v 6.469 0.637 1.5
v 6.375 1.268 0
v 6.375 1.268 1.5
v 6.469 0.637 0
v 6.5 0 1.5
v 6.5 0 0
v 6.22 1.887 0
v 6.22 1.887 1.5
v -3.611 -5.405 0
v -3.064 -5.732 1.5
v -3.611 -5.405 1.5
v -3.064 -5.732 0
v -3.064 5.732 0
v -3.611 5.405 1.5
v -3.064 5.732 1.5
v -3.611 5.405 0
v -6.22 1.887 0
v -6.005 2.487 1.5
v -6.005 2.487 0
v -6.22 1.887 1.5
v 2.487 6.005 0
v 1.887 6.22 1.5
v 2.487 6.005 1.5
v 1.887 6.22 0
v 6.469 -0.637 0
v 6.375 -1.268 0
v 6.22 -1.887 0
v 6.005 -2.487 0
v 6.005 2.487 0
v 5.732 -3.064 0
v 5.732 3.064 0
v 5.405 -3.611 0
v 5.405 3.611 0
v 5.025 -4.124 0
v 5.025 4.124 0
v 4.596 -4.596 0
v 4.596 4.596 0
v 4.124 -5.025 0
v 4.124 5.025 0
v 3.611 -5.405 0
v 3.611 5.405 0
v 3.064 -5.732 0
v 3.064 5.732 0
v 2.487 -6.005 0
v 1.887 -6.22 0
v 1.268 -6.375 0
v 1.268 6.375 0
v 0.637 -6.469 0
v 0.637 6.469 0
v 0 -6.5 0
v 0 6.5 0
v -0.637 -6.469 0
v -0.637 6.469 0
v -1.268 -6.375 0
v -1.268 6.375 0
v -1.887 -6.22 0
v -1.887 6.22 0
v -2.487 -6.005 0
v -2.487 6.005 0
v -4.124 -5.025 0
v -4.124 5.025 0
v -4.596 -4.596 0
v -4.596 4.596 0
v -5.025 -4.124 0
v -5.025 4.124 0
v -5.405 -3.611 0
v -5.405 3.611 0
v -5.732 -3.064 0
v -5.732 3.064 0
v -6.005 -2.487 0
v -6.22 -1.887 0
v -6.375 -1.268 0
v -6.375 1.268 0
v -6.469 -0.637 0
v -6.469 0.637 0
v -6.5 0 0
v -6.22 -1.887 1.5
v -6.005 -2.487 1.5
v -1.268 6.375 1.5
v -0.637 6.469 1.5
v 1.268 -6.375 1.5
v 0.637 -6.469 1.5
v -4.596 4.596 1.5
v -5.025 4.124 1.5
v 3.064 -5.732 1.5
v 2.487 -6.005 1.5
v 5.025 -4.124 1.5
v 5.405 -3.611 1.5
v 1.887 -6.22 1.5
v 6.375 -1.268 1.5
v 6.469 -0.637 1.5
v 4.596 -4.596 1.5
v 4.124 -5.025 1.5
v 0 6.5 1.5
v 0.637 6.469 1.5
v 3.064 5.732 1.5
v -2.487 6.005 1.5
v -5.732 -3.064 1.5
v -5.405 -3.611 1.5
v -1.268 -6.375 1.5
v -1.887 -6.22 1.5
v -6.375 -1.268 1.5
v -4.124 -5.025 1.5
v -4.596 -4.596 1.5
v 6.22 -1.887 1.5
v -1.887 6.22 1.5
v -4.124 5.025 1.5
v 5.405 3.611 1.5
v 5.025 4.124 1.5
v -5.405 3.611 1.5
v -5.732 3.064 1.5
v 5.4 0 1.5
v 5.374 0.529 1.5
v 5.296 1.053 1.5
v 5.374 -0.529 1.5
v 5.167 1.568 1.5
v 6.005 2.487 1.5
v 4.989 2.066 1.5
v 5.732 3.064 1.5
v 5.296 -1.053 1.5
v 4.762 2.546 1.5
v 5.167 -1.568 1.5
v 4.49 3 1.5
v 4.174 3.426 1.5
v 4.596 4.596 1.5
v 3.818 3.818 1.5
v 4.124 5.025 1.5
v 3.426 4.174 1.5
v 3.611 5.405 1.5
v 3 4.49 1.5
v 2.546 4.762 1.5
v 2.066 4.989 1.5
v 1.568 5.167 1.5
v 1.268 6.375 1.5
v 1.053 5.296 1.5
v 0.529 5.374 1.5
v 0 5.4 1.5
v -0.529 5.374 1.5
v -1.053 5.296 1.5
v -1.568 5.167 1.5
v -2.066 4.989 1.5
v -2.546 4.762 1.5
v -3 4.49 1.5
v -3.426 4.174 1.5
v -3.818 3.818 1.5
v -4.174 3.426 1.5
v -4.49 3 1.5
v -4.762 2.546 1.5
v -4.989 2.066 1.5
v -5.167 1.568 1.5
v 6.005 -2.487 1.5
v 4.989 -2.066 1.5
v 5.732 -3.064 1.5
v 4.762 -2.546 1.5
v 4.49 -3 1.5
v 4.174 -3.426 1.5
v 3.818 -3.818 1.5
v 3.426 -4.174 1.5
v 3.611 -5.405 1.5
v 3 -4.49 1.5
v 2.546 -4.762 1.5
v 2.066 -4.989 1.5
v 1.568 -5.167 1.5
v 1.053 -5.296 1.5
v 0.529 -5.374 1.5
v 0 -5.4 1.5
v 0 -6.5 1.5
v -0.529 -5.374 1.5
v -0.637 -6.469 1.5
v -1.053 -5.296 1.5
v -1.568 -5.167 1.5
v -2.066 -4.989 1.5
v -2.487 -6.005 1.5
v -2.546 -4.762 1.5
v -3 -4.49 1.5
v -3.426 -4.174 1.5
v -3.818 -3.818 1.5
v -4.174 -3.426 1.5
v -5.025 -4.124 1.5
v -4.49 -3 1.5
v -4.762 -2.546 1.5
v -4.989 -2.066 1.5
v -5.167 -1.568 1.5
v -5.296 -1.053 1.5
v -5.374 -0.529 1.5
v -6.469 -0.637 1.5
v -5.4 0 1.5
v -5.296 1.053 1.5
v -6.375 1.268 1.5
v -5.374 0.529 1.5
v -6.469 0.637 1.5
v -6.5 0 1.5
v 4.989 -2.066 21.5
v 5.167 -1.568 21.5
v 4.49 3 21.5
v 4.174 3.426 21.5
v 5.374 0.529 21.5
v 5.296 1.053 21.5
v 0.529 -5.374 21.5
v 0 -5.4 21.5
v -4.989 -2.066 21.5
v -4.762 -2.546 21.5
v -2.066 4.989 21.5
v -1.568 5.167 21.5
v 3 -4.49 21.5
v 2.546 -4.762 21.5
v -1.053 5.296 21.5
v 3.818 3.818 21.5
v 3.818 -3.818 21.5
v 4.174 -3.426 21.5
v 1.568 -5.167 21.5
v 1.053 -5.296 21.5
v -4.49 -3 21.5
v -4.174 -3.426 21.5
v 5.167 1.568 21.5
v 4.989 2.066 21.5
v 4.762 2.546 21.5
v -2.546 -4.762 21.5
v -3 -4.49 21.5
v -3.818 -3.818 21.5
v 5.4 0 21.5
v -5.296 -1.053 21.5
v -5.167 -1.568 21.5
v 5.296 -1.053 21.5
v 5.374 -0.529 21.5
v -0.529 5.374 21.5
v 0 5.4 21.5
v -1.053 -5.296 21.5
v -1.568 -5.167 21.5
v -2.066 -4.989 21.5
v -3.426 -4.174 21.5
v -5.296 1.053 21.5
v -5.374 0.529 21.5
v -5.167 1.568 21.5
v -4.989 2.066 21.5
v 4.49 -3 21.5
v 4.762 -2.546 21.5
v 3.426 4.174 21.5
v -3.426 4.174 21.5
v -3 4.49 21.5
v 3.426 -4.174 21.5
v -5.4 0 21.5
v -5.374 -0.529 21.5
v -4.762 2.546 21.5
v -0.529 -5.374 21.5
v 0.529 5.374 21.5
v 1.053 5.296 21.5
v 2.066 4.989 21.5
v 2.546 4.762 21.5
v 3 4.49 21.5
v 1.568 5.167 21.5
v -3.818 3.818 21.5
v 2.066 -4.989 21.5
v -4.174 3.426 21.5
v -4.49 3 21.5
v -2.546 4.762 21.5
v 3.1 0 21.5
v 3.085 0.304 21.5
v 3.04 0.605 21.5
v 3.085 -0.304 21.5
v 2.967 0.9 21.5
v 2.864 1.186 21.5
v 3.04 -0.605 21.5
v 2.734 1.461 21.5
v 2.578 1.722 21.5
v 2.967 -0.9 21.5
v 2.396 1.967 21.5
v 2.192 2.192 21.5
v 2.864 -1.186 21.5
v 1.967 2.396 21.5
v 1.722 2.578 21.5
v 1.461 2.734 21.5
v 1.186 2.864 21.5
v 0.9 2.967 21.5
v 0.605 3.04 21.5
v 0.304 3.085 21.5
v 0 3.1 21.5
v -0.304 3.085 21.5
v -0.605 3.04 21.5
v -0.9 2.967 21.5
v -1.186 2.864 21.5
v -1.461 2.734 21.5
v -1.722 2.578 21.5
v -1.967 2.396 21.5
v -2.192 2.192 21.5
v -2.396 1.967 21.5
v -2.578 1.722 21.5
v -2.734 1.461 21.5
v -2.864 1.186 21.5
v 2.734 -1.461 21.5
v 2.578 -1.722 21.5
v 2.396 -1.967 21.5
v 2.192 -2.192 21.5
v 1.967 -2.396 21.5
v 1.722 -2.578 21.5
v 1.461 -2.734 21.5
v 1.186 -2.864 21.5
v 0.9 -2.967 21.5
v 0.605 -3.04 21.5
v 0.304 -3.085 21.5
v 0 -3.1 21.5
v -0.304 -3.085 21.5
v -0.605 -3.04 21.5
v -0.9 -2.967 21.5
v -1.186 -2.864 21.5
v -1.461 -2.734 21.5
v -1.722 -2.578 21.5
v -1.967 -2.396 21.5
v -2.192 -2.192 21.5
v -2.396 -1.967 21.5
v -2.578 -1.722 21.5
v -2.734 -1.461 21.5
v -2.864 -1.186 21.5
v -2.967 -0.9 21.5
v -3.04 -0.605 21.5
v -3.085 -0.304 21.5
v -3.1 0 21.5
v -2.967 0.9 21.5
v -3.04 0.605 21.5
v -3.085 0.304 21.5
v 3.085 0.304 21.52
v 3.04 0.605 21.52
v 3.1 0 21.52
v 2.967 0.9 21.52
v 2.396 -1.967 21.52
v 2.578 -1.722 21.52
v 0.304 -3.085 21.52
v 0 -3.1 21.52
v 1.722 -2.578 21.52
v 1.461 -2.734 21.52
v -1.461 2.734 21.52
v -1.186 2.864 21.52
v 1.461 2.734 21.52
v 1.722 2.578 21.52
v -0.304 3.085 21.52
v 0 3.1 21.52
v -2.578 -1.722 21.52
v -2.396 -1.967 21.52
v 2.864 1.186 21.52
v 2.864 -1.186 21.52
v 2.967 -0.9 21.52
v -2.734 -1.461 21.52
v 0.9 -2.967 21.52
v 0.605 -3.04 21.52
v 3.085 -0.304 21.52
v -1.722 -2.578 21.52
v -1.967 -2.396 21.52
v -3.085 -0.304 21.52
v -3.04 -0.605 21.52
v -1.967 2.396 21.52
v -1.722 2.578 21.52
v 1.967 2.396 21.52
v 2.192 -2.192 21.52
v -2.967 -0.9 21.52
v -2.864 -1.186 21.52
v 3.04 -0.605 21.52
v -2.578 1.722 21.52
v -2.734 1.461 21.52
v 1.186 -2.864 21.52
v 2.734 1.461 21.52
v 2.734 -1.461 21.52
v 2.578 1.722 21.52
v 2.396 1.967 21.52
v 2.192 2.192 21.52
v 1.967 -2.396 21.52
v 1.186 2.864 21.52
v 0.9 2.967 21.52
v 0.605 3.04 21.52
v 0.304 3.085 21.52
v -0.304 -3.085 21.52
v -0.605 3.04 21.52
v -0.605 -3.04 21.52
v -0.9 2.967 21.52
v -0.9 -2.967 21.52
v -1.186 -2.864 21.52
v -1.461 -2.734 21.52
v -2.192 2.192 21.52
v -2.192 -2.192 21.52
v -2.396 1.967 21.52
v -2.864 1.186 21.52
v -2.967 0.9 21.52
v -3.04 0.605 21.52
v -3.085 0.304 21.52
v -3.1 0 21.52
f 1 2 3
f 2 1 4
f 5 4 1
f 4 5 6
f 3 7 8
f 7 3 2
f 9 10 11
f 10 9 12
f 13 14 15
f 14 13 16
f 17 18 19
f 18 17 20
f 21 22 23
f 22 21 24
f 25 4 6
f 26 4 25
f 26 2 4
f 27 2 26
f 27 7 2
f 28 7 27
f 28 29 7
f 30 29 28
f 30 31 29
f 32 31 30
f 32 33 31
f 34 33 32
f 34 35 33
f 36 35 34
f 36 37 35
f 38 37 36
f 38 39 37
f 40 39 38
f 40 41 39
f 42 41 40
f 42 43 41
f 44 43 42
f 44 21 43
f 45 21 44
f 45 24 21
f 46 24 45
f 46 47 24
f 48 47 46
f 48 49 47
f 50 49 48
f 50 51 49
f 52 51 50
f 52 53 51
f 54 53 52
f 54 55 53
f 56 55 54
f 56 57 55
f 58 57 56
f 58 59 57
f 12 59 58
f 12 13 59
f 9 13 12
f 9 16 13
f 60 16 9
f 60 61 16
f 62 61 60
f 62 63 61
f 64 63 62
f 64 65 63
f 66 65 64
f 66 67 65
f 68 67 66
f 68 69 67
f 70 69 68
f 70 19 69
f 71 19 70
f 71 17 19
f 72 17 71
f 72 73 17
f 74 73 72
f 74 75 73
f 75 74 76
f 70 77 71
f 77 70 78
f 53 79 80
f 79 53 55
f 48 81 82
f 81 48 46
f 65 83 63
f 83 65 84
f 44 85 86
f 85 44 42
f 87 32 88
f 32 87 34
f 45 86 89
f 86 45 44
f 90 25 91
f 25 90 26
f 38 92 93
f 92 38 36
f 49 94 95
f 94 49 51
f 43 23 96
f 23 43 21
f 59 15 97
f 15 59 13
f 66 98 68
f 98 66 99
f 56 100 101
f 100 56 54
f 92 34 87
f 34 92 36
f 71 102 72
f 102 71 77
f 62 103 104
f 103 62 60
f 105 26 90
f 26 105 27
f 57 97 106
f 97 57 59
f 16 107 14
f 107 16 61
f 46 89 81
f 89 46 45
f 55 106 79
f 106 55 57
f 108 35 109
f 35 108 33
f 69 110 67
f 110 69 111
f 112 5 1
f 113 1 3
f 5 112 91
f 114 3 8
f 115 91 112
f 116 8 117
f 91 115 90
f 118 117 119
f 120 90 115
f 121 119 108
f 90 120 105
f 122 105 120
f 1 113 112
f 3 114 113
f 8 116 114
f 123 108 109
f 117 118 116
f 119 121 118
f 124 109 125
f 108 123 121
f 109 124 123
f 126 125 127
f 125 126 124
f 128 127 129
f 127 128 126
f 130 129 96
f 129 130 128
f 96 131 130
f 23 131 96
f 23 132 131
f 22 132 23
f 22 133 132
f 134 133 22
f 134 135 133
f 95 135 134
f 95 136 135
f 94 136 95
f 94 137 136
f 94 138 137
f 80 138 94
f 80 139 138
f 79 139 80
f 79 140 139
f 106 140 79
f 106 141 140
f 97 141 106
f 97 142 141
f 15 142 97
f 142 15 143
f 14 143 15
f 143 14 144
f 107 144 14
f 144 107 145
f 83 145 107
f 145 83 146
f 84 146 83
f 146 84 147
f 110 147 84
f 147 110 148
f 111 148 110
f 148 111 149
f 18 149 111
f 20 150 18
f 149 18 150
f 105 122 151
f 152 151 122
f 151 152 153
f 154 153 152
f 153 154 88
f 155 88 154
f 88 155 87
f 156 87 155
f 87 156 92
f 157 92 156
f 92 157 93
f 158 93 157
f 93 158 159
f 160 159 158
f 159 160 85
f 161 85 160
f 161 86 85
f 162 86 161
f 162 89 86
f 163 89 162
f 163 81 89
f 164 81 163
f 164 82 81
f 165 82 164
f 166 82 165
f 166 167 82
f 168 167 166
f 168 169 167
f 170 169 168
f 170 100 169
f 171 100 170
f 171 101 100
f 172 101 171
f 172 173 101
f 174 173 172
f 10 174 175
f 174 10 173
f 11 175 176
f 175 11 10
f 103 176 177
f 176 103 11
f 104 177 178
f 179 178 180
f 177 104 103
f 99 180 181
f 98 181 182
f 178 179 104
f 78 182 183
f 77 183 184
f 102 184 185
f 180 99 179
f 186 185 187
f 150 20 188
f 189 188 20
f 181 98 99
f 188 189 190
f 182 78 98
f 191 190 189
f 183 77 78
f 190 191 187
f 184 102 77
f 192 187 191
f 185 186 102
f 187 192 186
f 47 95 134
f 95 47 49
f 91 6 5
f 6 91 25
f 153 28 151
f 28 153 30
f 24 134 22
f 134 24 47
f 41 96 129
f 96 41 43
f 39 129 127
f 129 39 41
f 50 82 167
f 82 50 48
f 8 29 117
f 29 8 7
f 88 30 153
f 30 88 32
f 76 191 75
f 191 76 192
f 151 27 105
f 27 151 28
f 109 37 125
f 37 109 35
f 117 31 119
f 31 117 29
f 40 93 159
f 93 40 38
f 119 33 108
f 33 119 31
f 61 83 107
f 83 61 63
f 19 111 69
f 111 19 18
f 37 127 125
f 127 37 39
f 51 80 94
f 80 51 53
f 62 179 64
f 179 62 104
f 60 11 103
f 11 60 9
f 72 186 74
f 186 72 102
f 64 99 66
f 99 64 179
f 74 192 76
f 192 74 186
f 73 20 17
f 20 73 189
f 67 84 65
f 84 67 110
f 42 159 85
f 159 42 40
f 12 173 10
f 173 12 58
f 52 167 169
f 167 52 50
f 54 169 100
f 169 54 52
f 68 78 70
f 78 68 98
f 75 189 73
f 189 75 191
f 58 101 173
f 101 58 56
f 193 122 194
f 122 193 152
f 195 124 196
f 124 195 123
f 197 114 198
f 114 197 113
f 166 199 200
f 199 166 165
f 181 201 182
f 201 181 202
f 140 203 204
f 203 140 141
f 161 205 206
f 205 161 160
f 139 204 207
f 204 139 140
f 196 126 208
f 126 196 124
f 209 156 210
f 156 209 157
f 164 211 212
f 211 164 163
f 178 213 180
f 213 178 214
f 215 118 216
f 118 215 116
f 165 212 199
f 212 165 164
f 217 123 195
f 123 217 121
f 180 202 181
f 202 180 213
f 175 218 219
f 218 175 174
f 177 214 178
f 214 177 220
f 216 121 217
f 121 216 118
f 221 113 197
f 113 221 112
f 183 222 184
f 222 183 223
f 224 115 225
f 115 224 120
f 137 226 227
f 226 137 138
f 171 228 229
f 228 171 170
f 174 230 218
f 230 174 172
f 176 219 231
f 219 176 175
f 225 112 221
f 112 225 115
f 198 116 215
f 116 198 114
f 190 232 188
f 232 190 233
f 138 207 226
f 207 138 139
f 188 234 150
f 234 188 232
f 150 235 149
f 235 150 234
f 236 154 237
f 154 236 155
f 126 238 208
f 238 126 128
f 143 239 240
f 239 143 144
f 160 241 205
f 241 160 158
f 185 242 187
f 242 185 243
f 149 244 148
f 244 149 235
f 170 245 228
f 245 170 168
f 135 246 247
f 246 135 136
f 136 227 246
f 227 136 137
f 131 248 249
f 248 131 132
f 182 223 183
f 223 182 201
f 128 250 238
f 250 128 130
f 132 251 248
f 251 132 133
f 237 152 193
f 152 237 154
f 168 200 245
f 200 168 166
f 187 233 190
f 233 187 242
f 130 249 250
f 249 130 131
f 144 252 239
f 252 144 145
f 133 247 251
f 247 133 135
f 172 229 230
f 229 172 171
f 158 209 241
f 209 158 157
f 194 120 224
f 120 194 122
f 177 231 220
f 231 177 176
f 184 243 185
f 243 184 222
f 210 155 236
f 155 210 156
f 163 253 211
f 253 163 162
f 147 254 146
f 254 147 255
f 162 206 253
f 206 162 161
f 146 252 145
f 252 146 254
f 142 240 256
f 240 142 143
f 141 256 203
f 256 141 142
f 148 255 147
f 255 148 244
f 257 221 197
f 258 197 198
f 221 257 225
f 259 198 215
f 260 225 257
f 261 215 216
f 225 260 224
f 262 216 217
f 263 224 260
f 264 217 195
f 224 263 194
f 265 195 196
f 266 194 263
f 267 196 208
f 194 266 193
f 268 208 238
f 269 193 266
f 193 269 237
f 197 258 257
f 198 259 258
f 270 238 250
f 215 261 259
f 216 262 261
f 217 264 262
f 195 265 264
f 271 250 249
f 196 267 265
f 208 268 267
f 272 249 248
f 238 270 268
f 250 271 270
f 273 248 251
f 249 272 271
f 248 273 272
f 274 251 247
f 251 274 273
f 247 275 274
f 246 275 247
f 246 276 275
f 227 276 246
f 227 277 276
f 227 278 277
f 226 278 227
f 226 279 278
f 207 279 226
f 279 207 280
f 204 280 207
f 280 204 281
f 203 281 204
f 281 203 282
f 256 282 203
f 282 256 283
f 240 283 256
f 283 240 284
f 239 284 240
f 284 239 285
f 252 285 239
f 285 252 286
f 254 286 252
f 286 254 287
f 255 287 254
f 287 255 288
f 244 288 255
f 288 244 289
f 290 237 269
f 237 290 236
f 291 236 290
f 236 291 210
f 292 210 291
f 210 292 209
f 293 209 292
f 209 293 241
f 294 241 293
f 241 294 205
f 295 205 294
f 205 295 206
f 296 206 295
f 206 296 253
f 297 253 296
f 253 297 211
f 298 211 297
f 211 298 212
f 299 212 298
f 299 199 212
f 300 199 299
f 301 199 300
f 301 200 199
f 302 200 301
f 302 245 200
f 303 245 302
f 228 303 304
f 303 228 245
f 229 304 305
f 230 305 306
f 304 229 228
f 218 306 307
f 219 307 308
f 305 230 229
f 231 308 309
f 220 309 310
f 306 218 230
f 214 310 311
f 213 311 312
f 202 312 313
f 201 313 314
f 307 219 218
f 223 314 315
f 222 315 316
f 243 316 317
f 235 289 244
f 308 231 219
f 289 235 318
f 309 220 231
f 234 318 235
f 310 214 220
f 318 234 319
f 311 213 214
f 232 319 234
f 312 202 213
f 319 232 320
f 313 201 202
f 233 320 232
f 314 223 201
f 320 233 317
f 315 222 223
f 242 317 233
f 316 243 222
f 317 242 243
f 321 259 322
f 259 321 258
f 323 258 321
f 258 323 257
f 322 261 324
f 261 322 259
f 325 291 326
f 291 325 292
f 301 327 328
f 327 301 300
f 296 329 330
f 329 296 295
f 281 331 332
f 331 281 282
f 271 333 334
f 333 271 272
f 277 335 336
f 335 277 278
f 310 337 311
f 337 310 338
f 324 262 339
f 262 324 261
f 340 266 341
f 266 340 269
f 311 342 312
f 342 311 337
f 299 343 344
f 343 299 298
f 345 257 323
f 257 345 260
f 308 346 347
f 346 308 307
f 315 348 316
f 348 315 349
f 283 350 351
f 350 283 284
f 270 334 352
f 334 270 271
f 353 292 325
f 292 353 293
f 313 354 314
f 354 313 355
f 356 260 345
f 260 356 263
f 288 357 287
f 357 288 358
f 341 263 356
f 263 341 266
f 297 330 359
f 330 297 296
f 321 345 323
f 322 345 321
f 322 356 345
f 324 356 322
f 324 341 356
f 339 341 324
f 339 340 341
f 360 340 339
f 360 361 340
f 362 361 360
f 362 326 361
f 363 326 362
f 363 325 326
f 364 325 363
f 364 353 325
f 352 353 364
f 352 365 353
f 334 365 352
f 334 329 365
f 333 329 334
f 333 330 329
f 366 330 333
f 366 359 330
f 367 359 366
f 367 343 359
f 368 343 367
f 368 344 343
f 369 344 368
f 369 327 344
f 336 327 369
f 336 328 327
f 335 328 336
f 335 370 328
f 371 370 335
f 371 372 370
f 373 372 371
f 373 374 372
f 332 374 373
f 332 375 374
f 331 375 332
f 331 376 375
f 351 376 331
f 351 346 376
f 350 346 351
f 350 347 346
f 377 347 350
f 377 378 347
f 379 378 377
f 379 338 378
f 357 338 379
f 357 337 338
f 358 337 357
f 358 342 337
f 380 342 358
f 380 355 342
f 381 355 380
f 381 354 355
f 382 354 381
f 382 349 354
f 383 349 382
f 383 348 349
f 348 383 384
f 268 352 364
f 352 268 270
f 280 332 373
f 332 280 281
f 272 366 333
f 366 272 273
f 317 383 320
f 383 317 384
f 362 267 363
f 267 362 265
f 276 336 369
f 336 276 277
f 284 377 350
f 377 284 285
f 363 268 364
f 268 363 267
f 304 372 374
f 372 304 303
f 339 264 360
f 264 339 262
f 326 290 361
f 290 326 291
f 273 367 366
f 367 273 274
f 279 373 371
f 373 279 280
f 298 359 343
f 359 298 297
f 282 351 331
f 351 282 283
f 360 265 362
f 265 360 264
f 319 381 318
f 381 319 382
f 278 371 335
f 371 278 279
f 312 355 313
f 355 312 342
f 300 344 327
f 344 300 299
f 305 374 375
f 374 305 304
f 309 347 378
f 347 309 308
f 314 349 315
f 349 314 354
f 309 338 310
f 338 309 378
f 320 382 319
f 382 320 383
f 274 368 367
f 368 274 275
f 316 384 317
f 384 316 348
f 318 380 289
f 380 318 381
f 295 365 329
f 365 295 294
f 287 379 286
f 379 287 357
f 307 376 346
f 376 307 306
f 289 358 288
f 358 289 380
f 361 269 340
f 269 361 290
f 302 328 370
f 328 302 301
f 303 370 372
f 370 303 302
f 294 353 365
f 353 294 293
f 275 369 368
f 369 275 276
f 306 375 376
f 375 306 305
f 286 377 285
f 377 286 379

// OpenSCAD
// Dimensions for 0.2 mL PCR Tube Adapter
// Units: mm

// Outer Diameter of the main sleeve body
sleeve_od = 10.8;
// Diameter of the collar that sits on the bed
collar_od = 13.0;
// Height of the collar (thickness)
collar_height = 1.5;
// Total height of the sleeve body
// Adjusted to 20.0 mm to accommodate the 1.5 mm collar and meet the 21.5 mm total height spec
sleeve_height = 20.0;
// Diameter of the bore (hole) for the tube
bore_diameter = 6.2;
// Wall thickness of the sleeve
wall_thickness = (sleeve_od - bore_diameter) / 2;

// Rendering settings
$fn = 64;

module main() {
    // The part is built on the XY plane (z=0) and grows upwards.
    
    // 1. The Base Collar
    // A flat disc that sits on the bed (bottom at z=0)
    cylinder(d = collar_od, h = collar_height);
    
    // 2. The Main Sleeve Body
    // Extrudes from the top of the collar to the full height
    translate([0, 0, collar_height])
        cylinder(d = sleeve_od, h = sleeve_height);
    
    // 3. The Bore
    // A cylinder cut through the entire part
    // Extends 0.01mm past the top and bottom faces to ensure clean cuts
    cylinder(d = bore_diameter, h = sleeve_height + collar_height + 0.02);
}

// Render the part
main();
